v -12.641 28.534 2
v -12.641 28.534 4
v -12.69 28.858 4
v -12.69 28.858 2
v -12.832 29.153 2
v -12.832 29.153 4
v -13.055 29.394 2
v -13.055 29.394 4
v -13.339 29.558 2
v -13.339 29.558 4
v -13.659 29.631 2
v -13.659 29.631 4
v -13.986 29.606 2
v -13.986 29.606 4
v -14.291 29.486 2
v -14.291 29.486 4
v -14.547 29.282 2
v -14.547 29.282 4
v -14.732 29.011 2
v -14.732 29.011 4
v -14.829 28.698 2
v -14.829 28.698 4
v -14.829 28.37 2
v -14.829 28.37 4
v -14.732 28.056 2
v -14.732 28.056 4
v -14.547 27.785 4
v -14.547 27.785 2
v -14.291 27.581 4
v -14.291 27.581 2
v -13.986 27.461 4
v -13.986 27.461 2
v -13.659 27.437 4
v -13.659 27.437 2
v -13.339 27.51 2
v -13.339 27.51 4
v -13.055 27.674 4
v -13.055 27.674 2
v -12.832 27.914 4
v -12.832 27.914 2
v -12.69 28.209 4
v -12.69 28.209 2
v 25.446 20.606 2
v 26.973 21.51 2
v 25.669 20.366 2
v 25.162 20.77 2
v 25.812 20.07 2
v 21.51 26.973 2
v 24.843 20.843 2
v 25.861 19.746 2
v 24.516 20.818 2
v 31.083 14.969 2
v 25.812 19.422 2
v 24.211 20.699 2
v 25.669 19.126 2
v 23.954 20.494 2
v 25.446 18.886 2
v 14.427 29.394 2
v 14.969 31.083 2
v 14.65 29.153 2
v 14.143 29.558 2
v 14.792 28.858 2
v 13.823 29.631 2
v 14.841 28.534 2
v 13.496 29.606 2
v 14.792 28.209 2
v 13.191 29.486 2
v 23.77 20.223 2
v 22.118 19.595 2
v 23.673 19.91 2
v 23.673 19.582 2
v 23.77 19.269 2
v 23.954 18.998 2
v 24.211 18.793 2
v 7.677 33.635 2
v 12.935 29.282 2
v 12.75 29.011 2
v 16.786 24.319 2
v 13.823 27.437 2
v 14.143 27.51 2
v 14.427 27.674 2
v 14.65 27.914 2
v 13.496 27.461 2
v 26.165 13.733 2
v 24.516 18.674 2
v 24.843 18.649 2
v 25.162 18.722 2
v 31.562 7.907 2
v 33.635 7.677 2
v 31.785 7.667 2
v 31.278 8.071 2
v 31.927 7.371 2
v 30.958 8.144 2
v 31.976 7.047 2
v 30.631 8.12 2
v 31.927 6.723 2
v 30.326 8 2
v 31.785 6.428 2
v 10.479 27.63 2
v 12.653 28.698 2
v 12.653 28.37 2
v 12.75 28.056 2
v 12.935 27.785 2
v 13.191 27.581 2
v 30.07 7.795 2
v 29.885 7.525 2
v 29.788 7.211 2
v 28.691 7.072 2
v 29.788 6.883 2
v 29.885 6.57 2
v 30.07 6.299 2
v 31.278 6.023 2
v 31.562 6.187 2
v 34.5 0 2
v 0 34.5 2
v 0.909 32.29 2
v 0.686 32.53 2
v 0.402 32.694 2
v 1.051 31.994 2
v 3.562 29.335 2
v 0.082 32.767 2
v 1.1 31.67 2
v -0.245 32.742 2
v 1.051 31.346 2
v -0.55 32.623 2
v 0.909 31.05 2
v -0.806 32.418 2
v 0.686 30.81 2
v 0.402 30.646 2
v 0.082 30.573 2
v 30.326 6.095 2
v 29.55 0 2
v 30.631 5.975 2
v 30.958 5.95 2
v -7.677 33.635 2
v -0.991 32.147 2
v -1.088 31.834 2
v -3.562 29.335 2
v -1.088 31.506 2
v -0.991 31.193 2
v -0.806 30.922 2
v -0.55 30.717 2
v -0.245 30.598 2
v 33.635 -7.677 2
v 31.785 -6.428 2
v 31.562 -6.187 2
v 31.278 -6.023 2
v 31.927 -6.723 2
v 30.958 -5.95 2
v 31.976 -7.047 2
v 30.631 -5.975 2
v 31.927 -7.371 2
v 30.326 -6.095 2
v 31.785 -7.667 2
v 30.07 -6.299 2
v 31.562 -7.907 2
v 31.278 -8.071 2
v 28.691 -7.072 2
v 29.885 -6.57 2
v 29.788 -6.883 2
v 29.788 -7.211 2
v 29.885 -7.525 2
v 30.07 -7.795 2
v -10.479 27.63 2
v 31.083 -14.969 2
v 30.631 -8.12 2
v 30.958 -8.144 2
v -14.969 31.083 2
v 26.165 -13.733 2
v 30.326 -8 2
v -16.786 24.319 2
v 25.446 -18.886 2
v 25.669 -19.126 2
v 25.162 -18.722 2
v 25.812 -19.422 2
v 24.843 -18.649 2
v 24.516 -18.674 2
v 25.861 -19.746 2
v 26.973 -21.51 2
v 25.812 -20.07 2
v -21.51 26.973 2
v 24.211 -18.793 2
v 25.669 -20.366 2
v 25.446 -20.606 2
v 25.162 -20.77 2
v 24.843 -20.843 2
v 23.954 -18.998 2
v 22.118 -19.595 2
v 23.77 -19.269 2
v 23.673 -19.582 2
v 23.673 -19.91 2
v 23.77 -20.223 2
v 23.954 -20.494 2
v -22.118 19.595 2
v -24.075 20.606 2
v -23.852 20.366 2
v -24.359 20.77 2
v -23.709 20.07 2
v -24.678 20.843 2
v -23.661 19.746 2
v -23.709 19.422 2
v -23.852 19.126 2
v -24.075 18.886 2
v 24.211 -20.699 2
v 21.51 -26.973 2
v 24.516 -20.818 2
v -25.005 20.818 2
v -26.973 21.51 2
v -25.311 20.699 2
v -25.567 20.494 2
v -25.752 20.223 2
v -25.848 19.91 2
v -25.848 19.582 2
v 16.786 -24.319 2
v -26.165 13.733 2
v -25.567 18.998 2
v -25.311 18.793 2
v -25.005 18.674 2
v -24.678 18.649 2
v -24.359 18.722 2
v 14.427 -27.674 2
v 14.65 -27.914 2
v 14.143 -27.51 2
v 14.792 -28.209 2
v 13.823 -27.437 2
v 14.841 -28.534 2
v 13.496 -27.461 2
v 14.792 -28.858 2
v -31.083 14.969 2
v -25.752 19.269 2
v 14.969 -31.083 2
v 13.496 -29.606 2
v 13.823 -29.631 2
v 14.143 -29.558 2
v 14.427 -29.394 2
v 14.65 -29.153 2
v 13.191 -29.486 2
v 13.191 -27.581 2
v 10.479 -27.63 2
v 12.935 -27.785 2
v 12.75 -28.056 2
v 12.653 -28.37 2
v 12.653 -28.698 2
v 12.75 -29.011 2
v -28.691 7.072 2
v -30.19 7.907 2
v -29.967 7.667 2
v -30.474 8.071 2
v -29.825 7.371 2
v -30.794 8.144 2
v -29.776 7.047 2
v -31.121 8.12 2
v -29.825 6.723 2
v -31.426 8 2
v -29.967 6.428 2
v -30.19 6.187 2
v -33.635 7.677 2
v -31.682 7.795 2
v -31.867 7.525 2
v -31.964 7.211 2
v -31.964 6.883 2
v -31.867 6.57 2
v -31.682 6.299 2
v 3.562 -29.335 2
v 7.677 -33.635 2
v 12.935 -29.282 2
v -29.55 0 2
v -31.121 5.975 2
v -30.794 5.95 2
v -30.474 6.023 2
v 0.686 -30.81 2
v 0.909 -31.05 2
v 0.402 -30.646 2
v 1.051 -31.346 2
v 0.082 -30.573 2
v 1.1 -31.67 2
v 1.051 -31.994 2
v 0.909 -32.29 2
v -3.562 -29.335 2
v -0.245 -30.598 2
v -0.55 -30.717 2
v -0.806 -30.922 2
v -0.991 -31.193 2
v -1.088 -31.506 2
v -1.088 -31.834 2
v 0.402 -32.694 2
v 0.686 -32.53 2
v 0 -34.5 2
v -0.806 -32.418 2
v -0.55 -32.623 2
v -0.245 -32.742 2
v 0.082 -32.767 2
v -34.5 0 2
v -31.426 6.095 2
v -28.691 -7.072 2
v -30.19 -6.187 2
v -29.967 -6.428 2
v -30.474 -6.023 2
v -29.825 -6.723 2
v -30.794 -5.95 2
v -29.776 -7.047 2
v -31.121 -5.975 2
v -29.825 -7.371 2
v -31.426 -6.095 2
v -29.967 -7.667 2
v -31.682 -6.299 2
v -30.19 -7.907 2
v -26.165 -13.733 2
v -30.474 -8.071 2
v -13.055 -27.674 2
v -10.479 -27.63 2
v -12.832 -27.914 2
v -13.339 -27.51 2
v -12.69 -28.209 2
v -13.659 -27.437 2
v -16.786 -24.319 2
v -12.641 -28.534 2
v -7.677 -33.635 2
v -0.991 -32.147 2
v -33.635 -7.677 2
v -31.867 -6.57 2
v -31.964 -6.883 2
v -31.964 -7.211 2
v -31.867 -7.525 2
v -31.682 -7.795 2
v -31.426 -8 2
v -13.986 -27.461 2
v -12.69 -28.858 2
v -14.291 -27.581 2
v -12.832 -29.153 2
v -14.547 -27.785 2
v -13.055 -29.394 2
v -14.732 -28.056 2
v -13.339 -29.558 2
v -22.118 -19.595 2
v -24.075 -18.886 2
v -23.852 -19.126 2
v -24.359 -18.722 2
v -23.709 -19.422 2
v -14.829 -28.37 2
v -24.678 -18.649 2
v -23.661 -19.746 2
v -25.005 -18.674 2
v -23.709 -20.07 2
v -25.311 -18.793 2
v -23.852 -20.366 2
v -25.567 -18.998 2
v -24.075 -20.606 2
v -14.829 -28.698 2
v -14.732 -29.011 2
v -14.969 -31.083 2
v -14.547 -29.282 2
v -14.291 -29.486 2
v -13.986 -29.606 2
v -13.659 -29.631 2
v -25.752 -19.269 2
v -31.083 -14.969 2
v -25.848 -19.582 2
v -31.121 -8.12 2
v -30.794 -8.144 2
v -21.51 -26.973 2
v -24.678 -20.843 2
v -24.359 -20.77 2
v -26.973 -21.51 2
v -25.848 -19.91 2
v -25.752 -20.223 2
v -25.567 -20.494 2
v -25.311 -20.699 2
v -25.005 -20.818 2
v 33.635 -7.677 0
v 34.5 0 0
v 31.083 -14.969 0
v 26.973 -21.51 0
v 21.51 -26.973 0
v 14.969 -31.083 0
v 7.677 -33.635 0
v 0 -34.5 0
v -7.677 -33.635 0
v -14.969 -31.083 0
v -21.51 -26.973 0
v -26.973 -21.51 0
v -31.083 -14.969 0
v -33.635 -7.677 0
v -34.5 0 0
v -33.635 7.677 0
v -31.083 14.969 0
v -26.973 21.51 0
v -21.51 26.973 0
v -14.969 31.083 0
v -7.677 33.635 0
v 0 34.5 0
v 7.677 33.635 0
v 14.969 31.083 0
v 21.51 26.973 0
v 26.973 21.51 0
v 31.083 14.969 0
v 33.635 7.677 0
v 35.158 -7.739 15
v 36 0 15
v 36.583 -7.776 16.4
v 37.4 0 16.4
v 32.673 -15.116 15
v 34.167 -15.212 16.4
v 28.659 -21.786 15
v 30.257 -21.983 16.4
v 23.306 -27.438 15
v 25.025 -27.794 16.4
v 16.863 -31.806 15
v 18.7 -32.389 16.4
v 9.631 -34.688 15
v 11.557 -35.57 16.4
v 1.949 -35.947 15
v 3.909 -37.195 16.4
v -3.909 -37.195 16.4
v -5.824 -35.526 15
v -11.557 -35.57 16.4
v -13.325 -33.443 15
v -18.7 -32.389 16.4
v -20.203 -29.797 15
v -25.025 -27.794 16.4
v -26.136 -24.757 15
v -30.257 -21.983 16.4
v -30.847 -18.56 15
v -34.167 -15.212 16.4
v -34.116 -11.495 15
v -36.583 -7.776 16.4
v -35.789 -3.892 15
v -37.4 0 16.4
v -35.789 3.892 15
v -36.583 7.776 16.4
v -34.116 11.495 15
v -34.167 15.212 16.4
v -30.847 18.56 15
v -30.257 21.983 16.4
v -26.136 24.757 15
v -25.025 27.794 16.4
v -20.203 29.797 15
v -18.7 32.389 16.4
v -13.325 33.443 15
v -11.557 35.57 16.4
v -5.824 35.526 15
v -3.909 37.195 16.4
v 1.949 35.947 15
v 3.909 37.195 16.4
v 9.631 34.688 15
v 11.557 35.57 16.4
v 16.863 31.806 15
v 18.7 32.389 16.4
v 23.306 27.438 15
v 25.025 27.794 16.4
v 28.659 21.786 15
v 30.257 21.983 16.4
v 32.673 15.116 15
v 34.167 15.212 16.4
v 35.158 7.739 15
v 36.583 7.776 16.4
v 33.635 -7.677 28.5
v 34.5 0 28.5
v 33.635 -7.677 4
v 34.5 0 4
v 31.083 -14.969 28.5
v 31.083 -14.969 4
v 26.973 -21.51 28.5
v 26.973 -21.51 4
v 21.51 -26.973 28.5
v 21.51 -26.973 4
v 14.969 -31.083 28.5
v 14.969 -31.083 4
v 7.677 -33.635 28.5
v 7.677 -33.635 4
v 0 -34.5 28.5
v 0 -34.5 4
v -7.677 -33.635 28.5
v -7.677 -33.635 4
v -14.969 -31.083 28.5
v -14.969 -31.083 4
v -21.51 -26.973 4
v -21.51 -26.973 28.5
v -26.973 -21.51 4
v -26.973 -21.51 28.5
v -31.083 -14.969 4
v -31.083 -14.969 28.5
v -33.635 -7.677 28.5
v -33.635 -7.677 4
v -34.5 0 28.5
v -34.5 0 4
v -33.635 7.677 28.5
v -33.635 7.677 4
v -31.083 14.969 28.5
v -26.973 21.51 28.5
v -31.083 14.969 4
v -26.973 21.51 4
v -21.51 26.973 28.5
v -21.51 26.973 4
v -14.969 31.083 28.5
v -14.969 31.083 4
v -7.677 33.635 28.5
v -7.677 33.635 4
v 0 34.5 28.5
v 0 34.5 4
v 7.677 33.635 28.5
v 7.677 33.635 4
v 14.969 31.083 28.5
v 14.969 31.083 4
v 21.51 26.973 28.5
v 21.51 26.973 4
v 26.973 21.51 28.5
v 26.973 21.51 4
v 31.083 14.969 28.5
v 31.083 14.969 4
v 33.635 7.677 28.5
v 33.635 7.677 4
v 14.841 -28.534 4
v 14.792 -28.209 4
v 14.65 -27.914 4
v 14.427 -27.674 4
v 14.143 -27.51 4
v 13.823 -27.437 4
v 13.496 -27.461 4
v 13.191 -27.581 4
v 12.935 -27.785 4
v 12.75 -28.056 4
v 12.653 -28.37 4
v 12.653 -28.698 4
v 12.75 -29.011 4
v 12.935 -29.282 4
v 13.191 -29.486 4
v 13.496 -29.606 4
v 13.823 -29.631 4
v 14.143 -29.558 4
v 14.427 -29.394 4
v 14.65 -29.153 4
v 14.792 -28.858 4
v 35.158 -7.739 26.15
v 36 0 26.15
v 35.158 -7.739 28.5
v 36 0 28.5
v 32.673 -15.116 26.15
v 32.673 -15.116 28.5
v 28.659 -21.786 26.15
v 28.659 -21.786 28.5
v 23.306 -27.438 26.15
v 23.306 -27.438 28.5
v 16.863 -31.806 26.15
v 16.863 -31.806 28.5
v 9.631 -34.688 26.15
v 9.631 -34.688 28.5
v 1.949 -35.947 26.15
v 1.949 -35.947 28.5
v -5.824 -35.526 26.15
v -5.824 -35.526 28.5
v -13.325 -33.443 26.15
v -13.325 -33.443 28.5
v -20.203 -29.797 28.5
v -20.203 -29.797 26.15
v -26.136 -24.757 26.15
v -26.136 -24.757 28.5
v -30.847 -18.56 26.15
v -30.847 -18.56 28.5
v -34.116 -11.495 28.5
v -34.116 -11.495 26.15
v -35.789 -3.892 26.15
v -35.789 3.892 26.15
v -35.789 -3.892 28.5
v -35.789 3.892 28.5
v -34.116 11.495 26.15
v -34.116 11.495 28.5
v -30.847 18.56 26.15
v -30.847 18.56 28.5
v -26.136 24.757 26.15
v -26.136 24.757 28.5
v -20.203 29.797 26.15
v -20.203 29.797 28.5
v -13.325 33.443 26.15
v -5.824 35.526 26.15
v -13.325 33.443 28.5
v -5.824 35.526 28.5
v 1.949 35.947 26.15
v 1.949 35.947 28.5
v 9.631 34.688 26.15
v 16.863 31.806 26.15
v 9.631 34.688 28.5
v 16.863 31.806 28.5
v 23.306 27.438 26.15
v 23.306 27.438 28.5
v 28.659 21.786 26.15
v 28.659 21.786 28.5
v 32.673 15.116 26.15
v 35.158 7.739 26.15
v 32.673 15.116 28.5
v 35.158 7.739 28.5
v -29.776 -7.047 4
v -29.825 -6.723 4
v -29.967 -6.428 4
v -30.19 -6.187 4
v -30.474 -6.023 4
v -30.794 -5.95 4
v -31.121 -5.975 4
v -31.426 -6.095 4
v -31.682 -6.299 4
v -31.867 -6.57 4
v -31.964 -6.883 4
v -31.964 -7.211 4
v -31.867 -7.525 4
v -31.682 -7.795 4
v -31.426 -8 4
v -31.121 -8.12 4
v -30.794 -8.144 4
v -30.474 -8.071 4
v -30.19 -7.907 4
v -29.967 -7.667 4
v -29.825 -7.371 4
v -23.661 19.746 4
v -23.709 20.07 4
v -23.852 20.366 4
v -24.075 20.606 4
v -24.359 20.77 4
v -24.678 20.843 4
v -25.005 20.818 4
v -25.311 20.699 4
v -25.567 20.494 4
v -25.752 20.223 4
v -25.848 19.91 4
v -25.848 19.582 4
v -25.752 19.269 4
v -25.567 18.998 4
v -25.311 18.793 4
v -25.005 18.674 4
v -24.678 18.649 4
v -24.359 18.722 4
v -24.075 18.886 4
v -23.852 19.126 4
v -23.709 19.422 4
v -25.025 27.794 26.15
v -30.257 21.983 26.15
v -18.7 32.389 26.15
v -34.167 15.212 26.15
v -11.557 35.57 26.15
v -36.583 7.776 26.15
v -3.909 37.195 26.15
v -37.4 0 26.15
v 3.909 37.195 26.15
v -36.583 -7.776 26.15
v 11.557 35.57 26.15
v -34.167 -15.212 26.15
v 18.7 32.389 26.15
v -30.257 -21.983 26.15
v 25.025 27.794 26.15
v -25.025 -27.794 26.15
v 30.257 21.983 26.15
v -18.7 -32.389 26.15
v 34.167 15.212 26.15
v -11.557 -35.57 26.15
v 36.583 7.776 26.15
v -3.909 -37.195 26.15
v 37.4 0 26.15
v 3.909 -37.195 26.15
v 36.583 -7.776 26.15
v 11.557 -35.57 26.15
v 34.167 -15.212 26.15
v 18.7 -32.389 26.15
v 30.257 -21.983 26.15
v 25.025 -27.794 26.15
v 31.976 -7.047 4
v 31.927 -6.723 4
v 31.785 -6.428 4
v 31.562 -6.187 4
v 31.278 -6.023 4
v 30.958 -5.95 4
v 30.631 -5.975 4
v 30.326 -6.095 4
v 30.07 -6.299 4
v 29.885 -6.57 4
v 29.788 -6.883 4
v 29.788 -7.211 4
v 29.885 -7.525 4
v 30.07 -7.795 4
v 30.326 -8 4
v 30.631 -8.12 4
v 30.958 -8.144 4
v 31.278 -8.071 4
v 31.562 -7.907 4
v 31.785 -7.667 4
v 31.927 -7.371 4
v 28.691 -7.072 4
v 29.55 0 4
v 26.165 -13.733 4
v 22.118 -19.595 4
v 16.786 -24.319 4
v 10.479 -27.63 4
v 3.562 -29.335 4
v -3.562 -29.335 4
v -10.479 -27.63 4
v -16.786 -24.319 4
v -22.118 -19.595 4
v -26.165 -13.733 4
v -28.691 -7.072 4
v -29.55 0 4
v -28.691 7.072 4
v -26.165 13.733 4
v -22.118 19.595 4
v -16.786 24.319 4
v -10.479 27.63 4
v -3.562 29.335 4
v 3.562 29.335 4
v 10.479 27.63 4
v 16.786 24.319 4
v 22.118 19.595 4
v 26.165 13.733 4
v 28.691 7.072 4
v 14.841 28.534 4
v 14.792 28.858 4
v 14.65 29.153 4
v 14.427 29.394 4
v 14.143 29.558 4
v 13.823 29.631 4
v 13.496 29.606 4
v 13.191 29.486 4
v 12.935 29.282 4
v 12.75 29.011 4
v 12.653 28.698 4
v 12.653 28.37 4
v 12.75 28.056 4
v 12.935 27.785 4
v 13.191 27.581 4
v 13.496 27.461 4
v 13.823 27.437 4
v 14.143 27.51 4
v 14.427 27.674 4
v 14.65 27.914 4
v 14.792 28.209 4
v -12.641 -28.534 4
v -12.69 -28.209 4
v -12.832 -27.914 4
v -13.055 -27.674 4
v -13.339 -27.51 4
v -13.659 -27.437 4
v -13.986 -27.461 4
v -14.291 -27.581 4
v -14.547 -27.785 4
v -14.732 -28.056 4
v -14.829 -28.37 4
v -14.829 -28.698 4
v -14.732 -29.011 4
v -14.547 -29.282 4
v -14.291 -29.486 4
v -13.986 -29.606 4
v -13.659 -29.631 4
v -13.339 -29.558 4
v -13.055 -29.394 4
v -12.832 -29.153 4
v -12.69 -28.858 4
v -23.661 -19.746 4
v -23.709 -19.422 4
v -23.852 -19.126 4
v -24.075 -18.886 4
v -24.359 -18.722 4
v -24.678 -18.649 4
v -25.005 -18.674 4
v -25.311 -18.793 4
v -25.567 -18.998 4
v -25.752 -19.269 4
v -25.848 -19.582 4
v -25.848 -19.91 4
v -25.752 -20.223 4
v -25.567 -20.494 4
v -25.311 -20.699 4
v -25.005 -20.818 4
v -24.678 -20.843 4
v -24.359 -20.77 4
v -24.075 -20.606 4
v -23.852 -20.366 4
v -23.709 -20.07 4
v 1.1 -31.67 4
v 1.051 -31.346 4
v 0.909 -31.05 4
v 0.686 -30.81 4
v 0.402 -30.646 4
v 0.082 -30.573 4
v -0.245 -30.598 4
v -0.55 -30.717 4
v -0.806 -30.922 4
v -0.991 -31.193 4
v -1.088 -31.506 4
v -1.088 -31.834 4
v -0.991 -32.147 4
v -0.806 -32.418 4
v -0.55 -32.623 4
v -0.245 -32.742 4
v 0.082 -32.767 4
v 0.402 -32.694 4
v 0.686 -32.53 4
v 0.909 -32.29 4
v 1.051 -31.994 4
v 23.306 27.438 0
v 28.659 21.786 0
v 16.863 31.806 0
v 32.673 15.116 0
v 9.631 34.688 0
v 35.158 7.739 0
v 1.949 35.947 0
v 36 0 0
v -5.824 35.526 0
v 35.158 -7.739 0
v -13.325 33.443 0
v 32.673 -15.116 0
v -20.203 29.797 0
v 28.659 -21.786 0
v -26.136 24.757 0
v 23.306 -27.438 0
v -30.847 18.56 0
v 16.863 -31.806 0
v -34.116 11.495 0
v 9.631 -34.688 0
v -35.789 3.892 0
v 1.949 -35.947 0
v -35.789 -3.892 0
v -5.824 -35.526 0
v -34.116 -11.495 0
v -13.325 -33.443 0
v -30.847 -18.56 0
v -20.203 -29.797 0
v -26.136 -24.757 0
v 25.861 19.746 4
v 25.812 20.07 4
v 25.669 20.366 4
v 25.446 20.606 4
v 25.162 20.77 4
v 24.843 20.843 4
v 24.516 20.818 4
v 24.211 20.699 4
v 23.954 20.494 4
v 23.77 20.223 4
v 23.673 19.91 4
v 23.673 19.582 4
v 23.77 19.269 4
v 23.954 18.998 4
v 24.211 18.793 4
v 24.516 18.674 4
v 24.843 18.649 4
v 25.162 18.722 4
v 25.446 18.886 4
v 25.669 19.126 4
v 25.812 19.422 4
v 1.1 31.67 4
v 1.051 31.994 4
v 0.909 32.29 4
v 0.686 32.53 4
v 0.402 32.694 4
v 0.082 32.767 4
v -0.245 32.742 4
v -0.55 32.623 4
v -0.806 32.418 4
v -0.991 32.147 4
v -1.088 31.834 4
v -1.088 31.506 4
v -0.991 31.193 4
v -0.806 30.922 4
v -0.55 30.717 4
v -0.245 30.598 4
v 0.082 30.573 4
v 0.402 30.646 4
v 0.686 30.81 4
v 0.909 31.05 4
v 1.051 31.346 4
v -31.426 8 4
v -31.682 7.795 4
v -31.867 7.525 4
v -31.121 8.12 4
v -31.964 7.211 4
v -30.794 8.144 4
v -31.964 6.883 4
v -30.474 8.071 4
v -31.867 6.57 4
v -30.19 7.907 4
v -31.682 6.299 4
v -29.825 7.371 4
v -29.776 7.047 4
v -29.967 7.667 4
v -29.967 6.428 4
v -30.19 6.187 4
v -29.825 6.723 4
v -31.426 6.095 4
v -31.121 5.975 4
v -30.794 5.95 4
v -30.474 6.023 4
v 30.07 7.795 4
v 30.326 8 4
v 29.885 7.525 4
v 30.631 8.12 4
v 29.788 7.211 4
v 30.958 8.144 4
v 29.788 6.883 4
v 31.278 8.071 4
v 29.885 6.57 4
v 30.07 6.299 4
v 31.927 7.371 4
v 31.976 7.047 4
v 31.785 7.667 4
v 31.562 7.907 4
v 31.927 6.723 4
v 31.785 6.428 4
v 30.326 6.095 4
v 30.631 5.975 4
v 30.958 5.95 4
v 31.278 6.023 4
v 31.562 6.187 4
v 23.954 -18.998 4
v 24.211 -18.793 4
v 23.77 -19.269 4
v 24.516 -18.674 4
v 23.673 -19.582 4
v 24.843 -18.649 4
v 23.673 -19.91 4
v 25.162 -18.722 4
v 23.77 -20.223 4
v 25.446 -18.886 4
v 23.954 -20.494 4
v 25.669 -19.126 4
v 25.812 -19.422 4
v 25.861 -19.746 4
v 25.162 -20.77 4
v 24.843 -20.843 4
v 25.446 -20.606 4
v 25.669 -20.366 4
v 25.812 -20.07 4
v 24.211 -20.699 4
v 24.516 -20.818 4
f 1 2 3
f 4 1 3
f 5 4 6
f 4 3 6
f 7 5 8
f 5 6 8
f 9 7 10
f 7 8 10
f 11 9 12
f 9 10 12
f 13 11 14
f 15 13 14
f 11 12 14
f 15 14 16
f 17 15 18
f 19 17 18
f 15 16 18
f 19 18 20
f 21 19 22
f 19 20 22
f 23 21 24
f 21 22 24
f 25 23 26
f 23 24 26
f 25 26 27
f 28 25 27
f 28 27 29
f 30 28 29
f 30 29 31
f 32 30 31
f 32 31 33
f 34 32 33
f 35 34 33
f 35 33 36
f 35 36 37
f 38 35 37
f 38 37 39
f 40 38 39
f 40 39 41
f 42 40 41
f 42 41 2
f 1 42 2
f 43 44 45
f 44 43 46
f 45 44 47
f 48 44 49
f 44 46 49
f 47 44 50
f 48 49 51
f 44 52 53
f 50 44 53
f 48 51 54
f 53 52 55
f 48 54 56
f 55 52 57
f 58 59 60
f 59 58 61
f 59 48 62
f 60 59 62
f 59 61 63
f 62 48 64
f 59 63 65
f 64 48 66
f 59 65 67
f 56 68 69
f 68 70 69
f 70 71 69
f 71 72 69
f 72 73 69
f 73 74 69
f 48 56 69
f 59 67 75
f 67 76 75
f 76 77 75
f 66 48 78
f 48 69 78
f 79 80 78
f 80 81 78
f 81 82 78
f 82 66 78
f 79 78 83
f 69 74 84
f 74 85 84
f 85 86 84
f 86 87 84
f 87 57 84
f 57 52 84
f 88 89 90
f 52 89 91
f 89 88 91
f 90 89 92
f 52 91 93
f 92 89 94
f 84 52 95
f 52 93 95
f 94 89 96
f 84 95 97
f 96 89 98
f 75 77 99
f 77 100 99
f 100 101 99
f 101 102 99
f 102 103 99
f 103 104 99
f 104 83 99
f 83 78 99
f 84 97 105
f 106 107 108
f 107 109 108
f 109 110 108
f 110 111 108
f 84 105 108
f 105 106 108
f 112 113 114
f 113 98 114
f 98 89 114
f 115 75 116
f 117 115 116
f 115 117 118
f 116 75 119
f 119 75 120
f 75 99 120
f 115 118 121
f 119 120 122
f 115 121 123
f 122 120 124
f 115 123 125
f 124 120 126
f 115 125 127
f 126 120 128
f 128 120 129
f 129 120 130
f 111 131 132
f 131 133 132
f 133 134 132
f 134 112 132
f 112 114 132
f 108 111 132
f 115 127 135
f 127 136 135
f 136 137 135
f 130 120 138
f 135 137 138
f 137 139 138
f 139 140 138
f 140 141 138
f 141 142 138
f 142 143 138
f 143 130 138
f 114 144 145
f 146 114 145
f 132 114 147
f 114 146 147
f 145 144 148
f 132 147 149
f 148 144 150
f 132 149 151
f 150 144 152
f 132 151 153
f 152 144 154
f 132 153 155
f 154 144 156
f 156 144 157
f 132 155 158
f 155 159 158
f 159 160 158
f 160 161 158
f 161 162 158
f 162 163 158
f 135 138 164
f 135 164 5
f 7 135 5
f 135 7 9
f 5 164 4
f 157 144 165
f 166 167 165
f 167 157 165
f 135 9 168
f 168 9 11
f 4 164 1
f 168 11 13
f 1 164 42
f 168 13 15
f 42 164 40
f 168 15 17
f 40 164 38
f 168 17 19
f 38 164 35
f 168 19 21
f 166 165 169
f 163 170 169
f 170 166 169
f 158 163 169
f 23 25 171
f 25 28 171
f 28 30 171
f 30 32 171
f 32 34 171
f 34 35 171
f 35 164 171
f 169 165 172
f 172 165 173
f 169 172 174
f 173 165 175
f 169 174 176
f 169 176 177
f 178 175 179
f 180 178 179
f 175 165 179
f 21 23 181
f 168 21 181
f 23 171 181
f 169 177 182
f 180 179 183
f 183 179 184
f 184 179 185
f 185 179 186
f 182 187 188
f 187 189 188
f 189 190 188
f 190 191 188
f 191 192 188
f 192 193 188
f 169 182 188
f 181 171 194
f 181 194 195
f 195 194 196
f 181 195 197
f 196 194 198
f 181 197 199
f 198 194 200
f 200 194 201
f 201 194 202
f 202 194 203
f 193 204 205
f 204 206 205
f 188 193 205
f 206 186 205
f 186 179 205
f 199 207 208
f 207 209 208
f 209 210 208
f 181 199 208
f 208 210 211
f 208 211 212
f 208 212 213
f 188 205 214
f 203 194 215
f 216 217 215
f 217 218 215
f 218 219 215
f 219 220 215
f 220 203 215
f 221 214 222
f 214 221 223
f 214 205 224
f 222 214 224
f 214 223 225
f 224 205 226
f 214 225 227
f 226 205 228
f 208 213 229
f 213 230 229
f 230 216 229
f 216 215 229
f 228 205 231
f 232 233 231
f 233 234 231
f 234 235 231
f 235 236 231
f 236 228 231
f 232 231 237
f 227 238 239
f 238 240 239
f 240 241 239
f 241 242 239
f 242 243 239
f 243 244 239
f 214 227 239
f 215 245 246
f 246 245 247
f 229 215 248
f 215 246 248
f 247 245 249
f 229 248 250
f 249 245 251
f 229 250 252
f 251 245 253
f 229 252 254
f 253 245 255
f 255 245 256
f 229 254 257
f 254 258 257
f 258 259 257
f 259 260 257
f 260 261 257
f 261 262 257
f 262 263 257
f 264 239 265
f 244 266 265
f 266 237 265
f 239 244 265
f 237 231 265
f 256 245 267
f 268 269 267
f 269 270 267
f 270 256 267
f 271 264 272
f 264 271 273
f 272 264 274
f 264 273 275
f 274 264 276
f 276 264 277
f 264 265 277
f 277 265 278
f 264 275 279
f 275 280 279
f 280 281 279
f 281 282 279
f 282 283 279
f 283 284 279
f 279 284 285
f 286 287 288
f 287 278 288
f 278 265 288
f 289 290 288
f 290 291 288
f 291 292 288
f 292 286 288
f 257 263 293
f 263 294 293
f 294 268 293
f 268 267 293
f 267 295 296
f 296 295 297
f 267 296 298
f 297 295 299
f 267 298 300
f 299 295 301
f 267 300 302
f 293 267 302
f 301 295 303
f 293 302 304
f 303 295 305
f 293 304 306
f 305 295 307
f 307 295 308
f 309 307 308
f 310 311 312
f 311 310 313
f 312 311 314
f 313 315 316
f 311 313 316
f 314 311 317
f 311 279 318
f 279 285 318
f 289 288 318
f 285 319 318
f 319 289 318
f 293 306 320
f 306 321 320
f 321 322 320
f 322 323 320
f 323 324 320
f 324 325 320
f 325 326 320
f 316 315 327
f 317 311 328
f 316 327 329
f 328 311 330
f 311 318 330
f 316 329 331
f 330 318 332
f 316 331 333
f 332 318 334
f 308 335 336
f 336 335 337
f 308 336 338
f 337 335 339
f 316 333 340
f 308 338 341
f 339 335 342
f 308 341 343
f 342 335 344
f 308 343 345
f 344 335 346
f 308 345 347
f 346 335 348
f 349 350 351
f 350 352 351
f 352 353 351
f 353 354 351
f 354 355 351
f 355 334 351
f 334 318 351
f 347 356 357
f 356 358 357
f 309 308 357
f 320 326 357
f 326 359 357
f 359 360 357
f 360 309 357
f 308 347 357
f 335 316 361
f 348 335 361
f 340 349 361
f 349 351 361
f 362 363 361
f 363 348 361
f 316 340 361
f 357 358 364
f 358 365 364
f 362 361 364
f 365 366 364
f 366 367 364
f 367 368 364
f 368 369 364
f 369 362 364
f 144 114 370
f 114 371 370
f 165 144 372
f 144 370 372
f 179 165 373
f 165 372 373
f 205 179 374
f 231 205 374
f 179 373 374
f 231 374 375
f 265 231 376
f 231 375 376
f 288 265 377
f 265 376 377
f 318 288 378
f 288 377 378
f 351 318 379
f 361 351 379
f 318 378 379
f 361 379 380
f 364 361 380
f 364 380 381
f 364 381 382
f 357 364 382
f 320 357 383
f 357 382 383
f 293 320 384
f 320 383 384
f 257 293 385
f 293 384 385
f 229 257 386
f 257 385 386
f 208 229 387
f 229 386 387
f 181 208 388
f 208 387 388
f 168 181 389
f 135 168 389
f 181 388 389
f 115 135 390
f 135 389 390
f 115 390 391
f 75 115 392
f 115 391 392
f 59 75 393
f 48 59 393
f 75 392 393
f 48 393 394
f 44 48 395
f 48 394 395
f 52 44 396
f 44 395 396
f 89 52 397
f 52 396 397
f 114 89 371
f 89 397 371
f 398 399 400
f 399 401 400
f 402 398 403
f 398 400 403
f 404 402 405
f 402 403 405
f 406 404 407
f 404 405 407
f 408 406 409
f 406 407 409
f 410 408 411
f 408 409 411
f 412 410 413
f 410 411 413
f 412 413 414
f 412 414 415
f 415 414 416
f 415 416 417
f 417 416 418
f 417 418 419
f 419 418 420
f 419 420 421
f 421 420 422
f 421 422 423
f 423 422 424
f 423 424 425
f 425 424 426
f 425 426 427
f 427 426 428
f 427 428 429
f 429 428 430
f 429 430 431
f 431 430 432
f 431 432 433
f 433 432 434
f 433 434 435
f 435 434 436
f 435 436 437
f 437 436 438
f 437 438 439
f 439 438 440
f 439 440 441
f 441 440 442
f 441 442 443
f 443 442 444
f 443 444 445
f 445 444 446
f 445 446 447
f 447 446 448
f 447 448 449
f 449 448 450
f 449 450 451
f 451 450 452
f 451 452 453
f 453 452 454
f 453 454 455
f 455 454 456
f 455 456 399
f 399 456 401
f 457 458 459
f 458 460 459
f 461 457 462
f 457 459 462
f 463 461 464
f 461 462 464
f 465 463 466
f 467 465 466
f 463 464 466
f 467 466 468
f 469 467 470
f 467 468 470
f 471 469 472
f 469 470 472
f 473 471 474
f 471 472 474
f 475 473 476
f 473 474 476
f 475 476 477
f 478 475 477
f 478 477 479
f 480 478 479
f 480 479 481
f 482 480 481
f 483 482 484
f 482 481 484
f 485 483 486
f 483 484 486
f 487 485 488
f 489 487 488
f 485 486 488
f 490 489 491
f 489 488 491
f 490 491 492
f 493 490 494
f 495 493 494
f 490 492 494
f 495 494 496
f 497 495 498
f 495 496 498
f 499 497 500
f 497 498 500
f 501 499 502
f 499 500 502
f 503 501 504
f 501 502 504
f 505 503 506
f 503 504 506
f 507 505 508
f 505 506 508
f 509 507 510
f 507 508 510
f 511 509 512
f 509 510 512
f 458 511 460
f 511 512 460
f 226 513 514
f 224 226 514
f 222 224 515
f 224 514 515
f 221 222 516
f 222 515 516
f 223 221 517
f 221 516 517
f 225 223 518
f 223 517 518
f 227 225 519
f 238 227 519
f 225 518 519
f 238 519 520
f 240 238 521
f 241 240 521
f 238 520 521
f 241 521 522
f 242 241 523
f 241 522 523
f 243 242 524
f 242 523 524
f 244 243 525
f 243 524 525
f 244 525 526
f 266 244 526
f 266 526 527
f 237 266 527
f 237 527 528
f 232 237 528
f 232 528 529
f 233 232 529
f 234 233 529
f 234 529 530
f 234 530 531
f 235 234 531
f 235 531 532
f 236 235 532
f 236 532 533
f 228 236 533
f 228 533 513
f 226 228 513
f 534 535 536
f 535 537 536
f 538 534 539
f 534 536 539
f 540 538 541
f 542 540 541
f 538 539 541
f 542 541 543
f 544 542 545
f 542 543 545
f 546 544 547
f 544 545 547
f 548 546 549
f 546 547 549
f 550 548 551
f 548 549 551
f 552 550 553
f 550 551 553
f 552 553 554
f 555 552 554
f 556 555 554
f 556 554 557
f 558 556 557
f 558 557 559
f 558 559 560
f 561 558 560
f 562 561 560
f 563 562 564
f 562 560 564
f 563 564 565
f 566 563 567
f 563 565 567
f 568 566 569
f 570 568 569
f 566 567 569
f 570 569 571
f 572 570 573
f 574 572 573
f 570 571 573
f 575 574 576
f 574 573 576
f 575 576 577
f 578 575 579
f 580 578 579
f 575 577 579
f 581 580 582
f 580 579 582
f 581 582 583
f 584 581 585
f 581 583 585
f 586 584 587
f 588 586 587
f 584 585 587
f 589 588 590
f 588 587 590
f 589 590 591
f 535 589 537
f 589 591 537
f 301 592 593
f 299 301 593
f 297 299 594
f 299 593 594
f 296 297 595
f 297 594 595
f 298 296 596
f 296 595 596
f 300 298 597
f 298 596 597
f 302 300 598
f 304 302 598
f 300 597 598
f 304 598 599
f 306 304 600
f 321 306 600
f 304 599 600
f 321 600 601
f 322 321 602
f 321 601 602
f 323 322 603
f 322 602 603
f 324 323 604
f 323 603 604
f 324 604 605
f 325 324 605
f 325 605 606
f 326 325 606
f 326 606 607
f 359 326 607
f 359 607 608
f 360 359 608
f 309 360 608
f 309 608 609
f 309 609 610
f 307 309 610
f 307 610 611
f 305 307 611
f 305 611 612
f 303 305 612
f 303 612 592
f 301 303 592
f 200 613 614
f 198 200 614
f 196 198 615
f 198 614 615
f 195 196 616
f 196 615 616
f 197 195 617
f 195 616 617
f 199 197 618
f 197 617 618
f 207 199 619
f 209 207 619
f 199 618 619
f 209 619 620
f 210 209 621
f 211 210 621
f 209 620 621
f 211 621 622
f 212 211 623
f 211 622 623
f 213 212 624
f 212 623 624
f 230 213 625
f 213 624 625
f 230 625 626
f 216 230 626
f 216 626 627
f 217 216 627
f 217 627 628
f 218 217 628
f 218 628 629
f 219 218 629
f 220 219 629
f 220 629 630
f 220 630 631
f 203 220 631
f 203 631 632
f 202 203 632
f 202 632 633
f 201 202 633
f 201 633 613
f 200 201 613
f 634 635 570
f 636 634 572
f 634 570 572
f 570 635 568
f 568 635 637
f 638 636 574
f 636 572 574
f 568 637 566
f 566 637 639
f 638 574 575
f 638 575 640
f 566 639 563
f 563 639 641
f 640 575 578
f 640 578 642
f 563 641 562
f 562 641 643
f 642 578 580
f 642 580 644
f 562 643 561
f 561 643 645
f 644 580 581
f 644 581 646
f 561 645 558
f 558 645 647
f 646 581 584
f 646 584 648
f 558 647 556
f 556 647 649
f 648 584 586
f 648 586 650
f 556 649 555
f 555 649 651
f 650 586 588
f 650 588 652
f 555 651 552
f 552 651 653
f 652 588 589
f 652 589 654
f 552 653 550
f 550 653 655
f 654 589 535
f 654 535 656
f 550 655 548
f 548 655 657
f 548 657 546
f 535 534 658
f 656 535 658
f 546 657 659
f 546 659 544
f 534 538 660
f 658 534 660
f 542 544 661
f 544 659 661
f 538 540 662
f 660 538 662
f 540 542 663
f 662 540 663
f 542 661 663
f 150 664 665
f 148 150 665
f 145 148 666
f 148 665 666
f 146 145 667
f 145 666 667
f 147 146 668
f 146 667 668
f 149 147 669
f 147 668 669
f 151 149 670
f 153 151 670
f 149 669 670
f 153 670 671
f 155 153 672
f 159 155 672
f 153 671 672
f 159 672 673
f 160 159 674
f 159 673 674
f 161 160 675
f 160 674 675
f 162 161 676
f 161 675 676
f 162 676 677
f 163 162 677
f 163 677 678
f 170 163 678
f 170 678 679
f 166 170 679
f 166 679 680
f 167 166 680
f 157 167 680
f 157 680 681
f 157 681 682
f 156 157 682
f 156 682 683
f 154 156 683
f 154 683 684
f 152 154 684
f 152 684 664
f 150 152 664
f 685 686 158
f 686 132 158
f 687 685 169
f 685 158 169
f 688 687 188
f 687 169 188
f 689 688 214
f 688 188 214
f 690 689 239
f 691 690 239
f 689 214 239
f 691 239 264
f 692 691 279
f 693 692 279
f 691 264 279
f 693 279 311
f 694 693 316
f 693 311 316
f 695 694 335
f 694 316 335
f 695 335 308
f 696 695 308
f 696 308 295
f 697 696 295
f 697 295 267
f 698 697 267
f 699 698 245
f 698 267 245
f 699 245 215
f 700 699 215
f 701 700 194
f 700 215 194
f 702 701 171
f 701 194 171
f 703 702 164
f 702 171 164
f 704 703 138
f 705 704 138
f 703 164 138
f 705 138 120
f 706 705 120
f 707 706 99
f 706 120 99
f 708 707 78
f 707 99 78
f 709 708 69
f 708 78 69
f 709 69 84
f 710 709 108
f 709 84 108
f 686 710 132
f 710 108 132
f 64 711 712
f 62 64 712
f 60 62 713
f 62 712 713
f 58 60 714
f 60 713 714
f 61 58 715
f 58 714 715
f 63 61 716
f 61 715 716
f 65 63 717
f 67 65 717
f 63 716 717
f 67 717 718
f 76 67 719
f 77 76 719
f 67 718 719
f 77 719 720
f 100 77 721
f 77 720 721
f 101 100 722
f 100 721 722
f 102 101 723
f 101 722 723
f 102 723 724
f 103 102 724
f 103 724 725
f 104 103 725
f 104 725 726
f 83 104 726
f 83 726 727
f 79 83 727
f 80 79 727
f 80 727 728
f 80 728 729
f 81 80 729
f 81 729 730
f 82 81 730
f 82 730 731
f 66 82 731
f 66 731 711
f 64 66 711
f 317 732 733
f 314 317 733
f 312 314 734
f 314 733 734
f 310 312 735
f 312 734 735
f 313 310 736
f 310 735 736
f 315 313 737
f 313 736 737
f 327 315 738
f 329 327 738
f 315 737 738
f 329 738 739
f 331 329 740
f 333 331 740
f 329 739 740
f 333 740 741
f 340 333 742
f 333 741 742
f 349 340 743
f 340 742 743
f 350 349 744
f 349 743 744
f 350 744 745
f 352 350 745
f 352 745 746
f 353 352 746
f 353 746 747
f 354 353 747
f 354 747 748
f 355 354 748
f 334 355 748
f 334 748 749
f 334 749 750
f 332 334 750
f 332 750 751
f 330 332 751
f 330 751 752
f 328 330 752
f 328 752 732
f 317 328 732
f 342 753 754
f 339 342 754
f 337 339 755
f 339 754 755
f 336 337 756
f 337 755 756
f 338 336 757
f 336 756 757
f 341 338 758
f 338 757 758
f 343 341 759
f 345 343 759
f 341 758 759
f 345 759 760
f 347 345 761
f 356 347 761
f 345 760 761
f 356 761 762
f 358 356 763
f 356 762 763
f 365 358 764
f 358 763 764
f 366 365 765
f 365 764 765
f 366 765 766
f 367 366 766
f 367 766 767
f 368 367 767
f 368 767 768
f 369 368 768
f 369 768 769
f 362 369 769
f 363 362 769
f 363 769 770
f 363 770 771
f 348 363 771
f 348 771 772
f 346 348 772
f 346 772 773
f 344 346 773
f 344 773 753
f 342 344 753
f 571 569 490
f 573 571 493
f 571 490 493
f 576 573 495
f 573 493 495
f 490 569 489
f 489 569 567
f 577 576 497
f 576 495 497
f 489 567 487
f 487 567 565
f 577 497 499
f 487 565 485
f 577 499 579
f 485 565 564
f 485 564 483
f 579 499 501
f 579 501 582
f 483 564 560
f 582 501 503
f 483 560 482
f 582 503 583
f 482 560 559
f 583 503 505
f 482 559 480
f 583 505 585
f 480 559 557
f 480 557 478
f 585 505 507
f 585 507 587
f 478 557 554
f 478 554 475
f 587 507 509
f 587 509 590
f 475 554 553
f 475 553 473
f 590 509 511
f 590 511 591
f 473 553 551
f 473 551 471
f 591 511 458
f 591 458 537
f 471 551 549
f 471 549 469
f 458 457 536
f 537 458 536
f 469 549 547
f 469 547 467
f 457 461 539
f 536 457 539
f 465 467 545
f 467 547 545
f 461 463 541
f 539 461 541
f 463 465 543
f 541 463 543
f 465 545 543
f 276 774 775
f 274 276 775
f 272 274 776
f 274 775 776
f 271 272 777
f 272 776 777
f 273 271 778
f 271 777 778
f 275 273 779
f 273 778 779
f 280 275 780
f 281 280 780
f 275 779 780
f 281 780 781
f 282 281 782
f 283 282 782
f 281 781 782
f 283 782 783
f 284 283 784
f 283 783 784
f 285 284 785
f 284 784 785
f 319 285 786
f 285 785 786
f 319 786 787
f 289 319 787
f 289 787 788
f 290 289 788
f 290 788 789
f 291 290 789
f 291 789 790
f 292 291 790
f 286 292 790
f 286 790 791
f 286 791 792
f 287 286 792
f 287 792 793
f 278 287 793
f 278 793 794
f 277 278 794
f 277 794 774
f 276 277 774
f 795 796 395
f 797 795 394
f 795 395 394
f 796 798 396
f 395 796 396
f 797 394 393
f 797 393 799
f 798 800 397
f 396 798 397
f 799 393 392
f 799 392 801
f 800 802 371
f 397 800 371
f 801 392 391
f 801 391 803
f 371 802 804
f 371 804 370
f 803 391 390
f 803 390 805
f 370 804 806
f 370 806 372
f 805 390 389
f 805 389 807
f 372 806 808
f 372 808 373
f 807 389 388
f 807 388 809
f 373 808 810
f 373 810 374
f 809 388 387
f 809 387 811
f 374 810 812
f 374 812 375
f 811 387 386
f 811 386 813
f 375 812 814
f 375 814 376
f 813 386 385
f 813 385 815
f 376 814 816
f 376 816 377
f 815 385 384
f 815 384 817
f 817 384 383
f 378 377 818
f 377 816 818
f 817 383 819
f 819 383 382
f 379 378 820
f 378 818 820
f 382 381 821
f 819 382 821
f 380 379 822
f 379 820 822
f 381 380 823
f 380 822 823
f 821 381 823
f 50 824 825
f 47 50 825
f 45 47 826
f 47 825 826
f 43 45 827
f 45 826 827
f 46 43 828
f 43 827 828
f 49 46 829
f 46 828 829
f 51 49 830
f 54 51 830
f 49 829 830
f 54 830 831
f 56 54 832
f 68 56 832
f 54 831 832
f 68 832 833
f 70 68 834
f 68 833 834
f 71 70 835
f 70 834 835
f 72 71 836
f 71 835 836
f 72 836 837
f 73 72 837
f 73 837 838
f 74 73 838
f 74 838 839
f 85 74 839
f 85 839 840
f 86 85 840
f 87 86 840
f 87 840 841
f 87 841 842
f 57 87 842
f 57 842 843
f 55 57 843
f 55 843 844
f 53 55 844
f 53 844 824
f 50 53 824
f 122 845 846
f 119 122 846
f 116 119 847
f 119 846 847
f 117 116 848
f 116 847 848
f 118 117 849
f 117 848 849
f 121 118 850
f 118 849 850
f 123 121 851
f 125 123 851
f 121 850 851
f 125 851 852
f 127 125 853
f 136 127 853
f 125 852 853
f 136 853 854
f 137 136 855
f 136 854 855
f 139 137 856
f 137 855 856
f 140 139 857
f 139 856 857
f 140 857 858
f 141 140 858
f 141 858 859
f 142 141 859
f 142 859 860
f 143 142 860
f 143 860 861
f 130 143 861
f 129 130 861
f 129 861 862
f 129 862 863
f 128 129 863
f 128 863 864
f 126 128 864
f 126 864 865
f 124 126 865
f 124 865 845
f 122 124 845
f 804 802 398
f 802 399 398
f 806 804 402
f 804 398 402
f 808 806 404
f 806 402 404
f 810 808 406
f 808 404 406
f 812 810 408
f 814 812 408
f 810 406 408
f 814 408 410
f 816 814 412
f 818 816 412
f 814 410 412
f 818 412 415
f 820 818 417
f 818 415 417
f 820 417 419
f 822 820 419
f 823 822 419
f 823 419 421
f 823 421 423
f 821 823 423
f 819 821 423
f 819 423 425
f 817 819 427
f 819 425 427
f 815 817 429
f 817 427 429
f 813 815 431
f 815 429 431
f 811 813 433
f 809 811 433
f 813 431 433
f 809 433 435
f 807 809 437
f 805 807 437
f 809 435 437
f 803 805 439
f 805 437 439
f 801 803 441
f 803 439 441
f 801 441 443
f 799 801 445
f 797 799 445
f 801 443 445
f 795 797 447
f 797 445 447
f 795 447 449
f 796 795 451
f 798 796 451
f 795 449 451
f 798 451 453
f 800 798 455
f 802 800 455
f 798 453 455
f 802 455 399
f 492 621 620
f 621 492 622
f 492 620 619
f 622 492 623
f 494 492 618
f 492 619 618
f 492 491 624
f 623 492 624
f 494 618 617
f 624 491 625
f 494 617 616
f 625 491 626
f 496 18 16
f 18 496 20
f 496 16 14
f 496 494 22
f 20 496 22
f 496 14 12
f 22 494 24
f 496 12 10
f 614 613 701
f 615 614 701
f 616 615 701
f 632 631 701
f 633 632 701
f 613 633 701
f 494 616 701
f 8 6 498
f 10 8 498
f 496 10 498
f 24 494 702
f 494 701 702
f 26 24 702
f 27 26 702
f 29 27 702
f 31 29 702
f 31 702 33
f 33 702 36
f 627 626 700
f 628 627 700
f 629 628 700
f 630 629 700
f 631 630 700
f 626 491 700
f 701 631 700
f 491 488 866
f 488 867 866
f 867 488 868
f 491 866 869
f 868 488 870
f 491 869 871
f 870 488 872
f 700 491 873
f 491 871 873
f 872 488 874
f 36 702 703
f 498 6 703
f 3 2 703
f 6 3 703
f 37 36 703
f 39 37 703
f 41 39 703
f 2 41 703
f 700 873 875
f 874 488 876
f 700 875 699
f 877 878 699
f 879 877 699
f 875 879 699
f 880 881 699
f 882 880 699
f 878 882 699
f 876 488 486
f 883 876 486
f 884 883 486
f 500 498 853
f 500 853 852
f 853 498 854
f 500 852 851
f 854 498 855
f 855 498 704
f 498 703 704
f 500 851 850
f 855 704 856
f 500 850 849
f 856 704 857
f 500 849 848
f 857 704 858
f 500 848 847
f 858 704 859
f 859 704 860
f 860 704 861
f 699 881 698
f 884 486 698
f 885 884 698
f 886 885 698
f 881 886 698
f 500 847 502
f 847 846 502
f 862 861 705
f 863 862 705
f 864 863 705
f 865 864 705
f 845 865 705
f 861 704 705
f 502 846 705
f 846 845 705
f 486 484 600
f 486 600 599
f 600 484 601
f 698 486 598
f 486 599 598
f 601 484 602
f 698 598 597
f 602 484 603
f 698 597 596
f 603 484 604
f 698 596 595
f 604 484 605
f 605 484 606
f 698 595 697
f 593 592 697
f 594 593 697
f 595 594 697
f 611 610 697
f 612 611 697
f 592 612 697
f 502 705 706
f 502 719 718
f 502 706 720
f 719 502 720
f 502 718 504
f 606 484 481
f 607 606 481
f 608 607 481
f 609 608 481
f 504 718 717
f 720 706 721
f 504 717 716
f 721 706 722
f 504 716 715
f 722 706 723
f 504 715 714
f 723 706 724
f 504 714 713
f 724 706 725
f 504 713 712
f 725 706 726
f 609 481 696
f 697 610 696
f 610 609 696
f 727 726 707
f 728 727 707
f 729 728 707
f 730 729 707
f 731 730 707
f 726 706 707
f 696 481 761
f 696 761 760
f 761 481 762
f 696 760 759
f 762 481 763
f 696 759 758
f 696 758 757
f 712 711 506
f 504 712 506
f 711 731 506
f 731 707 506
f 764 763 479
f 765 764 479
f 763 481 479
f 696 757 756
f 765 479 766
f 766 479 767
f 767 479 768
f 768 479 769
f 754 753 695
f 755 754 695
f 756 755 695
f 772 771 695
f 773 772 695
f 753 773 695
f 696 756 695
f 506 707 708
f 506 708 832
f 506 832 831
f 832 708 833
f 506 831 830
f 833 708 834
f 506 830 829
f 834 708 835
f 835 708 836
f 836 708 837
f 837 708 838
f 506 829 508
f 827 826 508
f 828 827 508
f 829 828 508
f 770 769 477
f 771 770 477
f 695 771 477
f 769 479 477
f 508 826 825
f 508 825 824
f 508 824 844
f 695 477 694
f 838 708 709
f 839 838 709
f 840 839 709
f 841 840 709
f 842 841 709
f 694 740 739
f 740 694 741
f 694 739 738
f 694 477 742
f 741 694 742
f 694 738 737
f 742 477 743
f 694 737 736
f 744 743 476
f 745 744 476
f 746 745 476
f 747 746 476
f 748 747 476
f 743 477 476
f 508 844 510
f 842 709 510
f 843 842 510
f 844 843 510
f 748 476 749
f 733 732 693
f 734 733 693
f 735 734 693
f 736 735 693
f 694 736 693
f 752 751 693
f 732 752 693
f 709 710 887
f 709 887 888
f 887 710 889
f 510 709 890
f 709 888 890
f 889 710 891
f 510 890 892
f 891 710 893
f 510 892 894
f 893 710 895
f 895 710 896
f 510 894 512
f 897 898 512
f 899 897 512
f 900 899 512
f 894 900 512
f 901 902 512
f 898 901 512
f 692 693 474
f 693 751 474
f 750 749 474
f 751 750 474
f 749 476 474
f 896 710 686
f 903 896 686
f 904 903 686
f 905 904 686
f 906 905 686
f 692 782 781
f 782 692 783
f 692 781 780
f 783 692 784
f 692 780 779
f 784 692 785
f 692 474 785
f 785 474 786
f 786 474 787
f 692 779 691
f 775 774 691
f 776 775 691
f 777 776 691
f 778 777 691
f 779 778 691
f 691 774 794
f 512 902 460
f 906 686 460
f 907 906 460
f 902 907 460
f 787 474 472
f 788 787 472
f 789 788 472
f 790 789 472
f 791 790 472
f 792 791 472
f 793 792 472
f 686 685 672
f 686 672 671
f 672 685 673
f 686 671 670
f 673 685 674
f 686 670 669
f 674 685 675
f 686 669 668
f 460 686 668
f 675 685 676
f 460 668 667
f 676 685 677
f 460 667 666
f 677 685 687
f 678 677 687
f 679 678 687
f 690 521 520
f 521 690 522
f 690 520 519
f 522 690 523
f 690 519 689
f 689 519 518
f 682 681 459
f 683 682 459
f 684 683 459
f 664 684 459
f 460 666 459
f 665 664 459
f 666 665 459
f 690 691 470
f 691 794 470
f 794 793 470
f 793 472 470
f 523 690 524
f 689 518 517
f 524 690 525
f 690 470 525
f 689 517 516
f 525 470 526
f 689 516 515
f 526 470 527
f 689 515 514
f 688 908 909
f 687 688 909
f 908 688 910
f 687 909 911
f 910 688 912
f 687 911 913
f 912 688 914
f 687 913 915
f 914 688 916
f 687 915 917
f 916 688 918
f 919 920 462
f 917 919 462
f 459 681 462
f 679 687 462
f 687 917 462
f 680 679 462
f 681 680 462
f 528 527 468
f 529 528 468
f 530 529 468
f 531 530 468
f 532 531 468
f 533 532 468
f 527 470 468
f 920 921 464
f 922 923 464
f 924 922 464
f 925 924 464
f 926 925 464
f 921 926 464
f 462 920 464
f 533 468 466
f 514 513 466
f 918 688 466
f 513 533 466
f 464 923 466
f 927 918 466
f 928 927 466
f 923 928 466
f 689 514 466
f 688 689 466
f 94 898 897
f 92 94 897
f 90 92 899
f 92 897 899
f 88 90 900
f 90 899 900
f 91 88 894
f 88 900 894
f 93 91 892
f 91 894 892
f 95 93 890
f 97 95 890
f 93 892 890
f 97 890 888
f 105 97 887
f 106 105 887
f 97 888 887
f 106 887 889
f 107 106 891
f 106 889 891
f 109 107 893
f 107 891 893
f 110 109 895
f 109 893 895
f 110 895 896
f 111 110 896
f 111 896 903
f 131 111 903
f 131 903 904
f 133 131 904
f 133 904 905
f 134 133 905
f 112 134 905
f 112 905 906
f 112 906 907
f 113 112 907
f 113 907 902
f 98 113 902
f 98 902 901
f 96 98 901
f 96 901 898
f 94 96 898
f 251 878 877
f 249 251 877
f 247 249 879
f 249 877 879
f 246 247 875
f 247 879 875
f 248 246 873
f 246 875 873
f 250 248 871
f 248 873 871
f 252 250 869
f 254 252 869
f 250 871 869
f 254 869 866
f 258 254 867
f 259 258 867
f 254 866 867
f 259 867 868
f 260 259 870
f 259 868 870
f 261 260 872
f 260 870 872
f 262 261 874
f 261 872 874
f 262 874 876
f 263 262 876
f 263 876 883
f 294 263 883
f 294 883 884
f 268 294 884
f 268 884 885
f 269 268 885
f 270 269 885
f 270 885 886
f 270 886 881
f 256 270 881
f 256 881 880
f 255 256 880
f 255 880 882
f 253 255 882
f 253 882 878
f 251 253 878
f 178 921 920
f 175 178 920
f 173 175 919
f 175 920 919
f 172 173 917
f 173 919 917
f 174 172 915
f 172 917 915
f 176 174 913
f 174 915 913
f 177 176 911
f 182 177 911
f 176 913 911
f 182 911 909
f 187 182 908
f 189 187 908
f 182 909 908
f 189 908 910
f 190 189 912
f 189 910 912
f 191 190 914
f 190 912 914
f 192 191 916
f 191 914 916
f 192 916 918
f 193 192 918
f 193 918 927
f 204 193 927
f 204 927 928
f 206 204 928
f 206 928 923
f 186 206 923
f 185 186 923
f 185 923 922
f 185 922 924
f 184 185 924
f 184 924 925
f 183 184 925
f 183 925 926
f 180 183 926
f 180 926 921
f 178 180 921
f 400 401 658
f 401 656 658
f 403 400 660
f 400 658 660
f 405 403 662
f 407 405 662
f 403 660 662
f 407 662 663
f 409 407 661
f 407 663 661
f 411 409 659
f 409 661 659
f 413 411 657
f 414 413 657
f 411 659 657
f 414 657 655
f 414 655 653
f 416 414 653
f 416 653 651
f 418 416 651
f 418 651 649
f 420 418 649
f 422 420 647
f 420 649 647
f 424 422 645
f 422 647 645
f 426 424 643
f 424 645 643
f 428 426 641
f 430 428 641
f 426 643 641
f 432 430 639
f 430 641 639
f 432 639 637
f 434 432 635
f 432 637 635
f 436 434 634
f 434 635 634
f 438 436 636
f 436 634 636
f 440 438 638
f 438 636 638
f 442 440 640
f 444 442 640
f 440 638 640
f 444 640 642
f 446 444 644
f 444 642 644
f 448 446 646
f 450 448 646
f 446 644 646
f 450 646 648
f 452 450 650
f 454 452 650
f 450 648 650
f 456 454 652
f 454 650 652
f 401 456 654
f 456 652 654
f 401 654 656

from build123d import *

# Parameters (mm, degrees)
ESQUISSE2_R             = 1.1
ENL_V_MAT_EXTRU_1_DEPTH = 59.29039372


with BuildPart() as part:
    # Esquisse1 → Révolution1 (revolve)
    with BuildSketch(Plane(origin=(0, 0, 0), x_dir=(0, 0, -1), z_dir=(1, 0, 0)), mode=Mode.PRIVATE) as r_volution1_sk:
        Polygon((0, 34.5), (0, 36), (-15, 36), (-16.4, 37.4), (-26.15, 37.4), (-26.15, 36), (-28.5, 36), (-28.5, 34.5), (-4, 34.5), (-4, 29.55), (-2, 29.55), (-2, 34.5), align=None)
    revolve(r_volution1_sk.sketch.rotate(Axis((0, 0, 14.835870703), (0, 0, -1)), 90), axis=Axis((0, 0, 14.835870703), (0, 0, -1)))

    # Esquisse2 → Enlèv. mat.-Extru.1 (cut, through all)
    with BuildSketch(Plane.XY.offset(4)):
        with Locations((0, 31.67)):
            Circle(ESQUISSE2_R)
        with Locations((13.741098018, 28.533684046)):
            Circle(ESQUISSE2_R)
        with Locations((24.76060305, 19.745922025)):
            Circle(ESQUISSE2_R)
        with Locations((30.875966979, 7.047237978)):
            Circle(ESQUISSE2_R)
        with Locations((30.875966979, -7.047237978)):
            Circle(ESQUISSE2_R)
        with Locations((24.76060305, -19.745922025)):
            Circle(ESQUISSE2_R)
        with Locations((13.741098018, -28.533684046)):
            Circle(ESQUISSE2_R)
        with Locations((0, -31.67)):
            Circle(ESQUISSE2_R)
        with Locations((-13.741098018, -28.533684046)):
            Circle(ESQUISSE2_R)
        with Locations((-24.76060305, -19.745922025)):
            Circle(ESQUISSE2_R)
        with Locations((-30.875966979, -7.047237978)):
            Circle(ESQUISSE2_R)
        with Locations((-30.875966979, 7.047237978)):
            Circle(ESQUISSE2_R)
        with Locations((-24.76060305, 19.745922025)):
            Circle(ESQUISSE2_R)
        with Locations((-13.741098018, 28.533684046)):
            Circle(ESQUISSE2_R)
    extrude(amount=-ENL_V_MAT_EXTRU_1_DEPTH, mode=Mode.SUBTRACT)


solid = part.part
